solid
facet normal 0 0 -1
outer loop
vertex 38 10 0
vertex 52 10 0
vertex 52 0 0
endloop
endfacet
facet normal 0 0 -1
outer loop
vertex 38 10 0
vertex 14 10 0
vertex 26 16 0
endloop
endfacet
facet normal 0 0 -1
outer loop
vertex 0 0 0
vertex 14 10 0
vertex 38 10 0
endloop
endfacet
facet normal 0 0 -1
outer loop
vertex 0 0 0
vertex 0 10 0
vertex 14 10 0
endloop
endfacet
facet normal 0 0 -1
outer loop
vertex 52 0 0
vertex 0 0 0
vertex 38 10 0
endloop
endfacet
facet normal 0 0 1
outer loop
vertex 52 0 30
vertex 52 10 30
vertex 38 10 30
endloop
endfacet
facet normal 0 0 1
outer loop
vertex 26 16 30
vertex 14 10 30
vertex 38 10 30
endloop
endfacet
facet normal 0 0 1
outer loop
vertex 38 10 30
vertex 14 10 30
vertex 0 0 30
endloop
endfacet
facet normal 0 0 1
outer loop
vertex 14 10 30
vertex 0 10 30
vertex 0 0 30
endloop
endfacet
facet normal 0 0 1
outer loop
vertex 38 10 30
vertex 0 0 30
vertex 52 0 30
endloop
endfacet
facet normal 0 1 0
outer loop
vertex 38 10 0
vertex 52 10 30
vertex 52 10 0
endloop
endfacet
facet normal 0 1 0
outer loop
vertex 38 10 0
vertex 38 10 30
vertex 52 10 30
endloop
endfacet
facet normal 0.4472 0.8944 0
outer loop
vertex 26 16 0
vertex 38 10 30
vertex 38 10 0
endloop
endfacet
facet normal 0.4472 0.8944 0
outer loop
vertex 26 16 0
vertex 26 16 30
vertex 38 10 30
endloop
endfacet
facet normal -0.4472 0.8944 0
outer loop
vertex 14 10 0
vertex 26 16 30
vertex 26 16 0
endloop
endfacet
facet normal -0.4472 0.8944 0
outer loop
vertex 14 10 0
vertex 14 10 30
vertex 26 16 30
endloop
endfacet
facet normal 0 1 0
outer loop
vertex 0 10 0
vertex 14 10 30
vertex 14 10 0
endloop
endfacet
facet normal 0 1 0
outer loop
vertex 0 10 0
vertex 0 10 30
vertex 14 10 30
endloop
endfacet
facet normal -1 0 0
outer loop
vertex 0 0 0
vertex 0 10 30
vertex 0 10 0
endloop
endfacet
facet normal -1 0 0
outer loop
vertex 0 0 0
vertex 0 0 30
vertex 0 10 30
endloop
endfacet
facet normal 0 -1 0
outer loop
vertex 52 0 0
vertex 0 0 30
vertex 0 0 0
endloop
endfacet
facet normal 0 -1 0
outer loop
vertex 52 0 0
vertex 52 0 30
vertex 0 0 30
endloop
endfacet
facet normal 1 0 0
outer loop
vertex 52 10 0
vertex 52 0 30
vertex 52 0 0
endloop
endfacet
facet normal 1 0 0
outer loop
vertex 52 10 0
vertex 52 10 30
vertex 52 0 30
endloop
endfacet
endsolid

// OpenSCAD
$fn = 32;

// ----------------------------------------------------------------------
// V guide rail: vrib, 52 mm wide
// ----------------------------------------------------------------------

// --- parameters (mm) ---
rail_w = 52;              // rail width, X
base_t = 10;              // base plate thickness
v_depth = 6;              // V feature depth / height
v_half_w = 12;            // half width of the V at the base face
plate_t = 30;             // rail length, Z (the extrusion height)

profile = [[0, 0], [52, 0], [52, 10], [38, 10], [26, 16], [14, 10], [0, 10]];  // primary outline, 7 points, counter clockwise

// --- the one profile operation ---
linear_extrude(height = plate_t) polygon(points = profile);
